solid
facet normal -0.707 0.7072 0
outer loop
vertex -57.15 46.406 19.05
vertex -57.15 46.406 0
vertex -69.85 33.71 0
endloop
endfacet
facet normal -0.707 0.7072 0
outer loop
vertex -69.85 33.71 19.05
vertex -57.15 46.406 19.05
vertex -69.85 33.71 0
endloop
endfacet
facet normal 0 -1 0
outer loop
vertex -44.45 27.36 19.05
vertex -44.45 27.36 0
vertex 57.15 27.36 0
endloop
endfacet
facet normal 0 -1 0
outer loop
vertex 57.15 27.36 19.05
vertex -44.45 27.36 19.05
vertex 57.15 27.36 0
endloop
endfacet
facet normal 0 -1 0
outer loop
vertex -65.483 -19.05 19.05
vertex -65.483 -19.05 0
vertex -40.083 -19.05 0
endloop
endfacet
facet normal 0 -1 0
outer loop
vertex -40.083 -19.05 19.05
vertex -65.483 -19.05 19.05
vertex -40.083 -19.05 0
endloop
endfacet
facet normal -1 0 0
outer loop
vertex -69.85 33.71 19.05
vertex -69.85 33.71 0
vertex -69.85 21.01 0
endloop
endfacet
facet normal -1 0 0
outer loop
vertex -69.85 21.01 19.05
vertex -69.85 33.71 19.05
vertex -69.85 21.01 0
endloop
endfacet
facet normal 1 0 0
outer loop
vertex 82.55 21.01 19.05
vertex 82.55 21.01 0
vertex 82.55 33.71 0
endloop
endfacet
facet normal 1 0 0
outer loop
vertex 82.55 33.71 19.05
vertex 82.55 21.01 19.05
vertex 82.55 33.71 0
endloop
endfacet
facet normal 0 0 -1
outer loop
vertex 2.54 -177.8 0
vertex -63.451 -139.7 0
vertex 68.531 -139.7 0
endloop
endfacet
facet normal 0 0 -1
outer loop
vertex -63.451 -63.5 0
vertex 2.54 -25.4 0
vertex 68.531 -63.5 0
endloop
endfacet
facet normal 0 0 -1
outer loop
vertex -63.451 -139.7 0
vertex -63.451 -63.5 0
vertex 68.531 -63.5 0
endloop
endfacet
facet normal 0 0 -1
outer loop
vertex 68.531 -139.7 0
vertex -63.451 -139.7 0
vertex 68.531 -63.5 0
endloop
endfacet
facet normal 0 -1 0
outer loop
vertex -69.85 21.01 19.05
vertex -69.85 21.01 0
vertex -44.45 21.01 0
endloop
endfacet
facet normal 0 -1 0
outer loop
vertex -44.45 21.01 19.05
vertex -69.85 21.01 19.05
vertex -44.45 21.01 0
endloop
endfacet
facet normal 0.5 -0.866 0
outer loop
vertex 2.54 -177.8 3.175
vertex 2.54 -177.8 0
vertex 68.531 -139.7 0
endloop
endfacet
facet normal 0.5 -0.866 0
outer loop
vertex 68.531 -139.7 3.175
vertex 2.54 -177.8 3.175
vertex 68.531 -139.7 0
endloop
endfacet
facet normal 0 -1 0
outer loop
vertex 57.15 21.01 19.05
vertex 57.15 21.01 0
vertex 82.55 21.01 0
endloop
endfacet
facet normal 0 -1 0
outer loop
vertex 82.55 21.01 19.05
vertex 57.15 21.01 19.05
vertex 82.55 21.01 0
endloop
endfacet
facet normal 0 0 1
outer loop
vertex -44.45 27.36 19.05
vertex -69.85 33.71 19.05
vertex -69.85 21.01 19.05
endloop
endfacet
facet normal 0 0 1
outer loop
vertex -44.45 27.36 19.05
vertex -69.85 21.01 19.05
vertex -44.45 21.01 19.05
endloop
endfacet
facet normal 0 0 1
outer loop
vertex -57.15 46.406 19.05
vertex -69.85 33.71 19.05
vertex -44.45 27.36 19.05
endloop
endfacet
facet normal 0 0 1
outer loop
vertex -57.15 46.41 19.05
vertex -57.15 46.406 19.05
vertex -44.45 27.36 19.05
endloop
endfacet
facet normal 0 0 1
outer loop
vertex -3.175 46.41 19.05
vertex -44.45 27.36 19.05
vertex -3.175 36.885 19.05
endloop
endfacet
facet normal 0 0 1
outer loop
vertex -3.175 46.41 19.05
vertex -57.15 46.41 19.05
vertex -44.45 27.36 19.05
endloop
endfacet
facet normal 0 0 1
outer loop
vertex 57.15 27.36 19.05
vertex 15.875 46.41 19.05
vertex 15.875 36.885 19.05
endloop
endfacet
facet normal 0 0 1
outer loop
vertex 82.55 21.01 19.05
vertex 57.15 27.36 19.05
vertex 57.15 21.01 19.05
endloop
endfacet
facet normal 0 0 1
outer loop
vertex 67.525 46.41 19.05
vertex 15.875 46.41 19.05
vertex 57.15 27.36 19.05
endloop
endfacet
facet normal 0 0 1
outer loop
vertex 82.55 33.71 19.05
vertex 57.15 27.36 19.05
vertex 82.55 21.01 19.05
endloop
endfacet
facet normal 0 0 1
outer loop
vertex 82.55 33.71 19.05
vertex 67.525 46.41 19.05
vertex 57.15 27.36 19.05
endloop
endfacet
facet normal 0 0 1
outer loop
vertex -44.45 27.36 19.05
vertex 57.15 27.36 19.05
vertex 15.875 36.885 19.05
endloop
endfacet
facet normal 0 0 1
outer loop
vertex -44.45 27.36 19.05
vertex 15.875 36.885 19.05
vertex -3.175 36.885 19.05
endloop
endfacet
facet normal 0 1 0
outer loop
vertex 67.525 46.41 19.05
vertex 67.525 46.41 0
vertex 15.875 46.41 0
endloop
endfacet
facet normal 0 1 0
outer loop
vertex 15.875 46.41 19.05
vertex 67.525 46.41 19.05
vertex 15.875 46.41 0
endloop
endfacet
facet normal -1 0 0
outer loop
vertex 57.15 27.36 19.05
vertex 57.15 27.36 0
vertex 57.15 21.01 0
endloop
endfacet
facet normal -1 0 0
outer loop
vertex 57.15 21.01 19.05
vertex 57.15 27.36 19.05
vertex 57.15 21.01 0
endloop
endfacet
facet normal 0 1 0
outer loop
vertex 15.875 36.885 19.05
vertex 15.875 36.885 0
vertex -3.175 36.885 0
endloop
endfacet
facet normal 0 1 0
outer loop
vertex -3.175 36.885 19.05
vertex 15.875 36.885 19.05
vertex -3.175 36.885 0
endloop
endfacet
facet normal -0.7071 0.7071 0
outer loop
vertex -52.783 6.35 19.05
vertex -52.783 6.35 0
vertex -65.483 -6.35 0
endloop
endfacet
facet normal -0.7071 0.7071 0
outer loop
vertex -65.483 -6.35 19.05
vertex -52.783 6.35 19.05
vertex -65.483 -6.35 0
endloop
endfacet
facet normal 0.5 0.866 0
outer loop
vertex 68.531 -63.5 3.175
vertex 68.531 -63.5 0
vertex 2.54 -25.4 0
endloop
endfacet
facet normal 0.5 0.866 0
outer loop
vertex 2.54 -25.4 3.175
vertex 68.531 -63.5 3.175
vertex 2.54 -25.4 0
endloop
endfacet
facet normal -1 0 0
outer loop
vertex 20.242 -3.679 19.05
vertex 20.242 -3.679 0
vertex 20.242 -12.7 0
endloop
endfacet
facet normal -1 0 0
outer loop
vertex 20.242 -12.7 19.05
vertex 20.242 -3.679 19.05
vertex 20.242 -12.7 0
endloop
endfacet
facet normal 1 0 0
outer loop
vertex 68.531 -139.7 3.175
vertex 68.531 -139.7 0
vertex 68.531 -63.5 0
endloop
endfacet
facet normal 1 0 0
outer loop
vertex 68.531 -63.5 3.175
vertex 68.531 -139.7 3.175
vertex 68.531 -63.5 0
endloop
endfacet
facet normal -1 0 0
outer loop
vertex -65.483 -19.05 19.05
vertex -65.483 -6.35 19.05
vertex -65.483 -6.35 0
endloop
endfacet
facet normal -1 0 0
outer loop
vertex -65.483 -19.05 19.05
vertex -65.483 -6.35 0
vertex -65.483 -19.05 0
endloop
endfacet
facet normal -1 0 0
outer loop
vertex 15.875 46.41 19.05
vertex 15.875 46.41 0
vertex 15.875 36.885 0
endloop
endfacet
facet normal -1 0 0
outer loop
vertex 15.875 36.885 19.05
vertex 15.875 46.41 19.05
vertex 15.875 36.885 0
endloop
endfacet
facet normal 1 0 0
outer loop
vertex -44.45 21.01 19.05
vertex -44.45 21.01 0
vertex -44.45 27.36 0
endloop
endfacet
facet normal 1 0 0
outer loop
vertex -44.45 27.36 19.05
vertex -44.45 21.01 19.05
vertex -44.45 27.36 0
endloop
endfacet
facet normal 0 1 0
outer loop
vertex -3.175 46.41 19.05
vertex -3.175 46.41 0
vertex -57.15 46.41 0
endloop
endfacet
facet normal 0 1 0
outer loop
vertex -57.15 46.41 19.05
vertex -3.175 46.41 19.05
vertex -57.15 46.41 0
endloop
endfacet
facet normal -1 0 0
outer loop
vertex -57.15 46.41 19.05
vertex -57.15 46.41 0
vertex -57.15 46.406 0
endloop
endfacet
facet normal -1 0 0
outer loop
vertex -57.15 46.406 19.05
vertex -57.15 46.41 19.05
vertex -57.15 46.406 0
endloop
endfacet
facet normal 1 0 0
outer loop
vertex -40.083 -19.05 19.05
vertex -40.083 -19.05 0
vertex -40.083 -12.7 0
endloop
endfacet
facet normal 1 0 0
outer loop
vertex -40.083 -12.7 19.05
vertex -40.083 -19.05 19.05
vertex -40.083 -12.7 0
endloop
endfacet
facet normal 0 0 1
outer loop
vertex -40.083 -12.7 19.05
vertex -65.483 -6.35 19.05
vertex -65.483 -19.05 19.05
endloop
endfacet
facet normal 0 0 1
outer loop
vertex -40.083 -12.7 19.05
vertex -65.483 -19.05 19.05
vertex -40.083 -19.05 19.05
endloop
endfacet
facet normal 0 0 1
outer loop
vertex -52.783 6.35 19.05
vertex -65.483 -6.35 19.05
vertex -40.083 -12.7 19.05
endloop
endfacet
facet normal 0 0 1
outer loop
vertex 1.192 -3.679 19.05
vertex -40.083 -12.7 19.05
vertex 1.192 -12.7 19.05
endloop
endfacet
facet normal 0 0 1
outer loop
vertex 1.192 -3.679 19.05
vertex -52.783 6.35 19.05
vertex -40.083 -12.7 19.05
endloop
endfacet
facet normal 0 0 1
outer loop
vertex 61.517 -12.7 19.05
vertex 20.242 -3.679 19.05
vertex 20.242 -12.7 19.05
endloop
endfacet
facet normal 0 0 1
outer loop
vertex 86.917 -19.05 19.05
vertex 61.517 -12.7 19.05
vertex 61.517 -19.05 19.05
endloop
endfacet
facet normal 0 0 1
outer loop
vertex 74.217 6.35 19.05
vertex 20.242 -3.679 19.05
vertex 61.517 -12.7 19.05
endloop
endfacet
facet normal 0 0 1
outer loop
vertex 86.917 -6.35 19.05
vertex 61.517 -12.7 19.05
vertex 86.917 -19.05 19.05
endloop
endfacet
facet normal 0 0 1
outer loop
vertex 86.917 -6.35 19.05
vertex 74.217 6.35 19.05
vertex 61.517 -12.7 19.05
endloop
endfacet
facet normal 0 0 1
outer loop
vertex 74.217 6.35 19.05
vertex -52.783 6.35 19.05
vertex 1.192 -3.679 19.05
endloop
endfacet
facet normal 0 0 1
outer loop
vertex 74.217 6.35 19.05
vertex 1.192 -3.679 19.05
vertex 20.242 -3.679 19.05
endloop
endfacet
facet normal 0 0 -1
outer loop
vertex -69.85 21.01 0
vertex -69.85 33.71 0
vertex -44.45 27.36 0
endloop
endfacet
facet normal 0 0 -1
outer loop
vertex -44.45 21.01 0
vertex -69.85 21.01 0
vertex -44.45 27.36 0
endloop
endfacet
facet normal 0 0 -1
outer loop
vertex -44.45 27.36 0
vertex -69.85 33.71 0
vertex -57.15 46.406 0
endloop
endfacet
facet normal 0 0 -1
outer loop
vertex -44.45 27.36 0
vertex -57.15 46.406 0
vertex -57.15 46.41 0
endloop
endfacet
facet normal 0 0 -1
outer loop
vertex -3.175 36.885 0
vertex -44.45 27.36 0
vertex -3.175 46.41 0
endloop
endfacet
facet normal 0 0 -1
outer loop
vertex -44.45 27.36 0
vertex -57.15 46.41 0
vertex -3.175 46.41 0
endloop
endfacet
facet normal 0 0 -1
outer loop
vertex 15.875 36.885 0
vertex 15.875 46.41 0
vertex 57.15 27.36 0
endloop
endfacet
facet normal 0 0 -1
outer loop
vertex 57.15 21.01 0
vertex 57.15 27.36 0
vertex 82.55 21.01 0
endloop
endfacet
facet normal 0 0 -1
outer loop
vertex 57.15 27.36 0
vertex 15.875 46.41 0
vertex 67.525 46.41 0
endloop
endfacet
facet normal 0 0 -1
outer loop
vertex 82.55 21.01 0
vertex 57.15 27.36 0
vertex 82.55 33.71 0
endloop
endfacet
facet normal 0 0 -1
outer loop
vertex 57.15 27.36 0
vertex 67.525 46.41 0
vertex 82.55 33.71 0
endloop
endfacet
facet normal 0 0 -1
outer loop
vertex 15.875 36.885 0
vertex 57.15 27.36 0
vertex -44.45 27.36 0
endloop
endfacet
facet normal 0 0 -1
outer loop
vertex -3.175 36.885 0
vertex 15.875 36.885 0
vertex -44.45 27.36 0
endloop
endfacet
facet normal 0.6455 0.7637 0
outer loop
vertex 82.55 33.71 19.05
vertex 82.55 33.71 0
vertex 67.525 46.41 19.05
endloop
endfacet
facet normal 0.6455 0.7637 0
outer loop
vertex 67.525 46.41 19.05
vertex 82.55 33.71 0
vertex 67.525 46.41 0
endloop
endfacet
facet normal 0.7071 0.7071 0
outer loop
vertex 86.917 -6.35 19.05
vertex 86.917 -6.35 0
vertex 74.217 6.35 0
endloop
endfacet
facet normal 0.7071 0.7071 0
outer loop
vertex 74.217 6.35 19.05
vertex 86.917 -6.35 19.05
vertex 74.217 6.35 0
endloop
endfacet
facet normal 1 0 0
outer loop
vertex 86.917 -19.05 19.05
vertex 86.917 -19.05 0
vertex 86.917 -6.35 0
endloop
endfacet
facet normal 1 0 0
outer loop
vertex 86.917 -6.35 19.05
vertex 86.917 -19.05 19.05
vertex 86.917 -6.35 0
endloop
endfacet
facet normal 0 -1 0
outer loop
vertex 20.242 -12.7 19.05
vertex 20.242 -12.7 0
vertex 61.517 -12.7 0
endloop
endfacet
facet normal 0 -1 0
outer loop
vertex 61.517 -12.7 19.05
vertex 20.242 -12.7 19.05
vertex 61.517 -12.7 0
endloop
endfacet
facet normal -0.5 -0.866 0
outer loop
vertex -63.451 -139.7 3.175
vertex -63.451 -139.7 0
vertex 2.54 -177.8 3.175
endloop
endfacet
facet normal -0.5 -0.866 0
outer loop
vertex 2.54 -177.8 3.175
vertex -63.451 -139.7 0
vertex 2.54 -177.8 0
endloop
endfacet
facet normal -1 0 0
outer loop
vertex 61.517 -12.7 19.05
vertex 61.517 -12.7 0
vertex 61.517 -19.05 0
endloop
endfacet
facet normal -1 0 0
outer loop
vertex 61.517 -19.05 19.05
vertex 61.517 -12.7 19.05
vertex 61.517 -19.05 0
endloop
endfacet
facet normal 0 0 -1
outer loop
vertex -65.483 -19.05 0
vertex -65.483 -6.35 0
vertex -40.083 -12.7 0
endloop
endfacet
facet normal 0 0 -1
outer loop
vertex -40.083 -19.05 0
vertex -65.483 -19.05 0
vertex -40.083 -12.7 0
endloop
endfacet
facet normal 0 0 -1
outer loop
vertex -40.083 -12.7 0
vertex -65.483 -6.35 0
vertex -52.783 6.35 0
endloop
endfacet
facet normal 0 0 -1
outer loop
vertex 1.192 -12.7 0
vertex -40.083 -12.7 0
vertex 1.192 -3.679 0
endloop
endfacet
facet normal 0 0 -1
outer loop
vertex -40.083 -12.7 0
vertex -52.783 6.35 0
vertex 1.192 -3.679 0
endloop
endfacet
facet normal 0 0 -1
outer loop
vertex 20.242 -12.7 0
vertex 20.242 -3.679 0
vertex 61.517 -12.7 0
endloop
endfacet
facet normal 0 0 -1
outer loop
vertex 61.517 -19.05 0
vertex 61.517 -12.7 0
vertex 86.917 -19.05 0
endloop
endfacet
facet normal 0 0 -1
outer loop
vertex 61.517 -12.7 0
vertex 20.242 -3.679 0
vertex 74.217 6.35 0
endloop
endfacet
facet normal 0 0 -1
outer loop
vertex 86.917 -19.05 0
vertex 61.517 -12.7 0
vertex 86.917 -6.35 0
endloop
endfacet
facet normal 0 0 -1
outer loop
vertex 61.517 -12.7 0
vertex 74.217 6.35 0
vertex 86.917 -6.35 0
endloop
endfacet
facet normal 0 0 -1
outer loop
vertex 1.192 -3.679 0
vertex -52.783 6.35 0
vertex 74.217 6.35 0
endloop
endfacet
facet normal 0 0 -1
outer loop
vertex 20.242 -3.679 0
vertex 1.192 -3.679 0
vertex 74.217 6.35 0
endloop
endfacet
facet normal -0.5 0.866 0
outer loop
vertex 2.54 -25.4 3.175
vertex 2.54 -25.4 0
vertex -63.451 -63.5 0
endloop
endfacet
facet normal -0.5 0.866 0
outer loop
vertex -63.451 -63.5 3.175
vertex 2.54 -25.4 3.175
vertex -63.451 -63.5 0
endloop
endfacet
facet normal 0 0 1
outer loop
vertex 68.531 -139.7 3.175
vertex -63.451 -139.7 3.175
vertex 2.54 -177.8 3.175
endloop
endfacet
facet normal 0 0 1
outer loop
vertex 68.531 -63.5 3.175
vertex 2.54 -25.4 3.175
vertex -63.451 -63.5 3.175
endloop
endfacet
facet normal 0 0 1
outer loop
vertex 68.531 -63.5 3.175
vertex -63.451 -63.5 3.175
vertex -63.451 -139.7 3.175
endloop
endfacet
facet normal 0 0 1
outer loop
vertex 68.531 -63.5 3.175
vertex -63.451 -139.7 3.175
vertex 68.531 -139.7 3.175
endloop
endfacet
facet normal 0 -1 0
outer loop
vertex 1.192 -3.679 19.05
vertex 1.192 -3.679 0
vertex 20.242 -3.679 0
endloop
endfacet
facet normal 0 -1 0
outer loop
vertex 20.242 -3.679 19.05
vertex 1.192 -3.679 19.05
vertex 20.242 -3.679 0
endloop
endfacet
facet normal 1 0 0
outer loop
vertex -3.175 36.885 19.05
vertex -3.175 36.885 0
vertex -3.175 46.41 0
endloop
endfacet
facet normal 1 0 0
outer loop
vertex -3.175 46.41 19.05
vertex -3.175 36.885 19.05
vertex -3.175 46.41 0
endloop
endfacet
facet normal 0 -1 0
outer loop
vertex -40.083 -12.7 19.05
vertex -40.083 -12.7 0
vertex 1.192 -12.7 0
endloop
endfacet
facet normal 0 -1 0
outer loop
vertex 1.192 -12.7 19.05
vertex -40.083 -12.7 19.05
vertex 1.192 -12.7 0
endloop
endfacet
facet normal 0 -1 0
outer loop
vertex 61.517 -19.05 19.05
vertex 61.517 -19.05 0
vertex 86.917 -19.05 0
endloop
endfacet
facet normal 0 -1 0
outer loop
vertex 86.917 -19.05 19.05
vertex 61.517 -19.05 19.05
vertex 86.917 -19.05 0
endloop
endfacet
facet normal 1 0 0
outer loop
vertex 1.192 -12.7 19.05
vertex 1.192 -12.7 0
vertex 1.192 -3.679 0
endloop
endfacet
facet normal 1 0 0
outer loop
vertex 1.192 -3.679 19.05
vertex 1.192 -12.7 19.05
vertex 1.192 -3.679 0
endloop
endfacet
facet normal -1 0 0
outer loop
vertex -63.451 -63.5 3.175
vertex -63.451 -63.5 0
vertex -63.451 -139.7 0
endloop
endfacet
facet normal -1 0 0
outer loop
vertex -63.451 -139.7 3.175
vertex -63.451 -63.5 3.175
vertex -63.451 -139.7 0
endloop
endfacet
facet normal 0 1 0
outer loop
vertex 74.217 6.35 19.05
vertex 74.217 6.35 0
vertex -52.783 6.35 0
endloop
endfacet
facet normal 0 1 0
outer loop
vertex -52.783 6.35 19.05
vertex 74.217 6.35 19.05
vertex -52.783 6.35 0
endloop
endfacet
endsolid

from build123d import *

# Parameters (mm, degrees)
F1_DEPTH = 19.05
F3_DEPTH = 19.05
F5_DEPTH = 3.175


with BuildPart() as f1:
    # F0 (on Top) → F1 (new body)
    with BuildSketch(Plane.XY):
        Polygon((74.217341, 6.35), (-52.782659, 6.35), (-65.482659, -6.35), (-65.482659, -19.05), (-40.082659, -19.05), (-40.082659, -12.7), (1.192341, -12.7), (1.192341, -3.67947), (20.242341, -3.67947), (20.242341, -12.7), (61.517341, -12.7), (61.517341, -19.05), (86.917341, -19.05), (86.917341, -6.35), align=None)
    extrude(amount=F1_DEPTH)


with BuildPart() as f3:
    # F2 (on Top) → F3 (new body)
    with BuildSketch(Plane.XY):
        Polygon((-44.509392, 46.409821), (-57.15, 46.409821), (-57.150001, 46.405985), (-69.850001, 33.709821), (-69.850002, 21.009821), (-44.450002, 21.009821), (-44.450002, 27.359821), (57.149998, 27.359821), (57.149998, 21.009821), (82.549998, 21.009821), (82.549999, 33.709821), (67.524716, 46.409821), (15.875, 46.409821), (15.875, 36.884821), (-3.175, 36.884821), (-3.175, 46.409821), align=None)
    extrude(amount=F3_DEPTH)


with BuildPart() as f5:
    # F4 (on Top) → F5 (new body)
    with BuildSketch(Plane.XY):
        Polygon((68.531145, -63.50007), (2.54001, -25.40007), (-63.451126, -63.50007), (-63.451126, -139.70007), (2.54001, -177.80007), (68.531145, -139.70007), align=None)
    extrude(amount=F5_DEPTH)


solid = Compound([f1.part, f3.part, f5.part])
